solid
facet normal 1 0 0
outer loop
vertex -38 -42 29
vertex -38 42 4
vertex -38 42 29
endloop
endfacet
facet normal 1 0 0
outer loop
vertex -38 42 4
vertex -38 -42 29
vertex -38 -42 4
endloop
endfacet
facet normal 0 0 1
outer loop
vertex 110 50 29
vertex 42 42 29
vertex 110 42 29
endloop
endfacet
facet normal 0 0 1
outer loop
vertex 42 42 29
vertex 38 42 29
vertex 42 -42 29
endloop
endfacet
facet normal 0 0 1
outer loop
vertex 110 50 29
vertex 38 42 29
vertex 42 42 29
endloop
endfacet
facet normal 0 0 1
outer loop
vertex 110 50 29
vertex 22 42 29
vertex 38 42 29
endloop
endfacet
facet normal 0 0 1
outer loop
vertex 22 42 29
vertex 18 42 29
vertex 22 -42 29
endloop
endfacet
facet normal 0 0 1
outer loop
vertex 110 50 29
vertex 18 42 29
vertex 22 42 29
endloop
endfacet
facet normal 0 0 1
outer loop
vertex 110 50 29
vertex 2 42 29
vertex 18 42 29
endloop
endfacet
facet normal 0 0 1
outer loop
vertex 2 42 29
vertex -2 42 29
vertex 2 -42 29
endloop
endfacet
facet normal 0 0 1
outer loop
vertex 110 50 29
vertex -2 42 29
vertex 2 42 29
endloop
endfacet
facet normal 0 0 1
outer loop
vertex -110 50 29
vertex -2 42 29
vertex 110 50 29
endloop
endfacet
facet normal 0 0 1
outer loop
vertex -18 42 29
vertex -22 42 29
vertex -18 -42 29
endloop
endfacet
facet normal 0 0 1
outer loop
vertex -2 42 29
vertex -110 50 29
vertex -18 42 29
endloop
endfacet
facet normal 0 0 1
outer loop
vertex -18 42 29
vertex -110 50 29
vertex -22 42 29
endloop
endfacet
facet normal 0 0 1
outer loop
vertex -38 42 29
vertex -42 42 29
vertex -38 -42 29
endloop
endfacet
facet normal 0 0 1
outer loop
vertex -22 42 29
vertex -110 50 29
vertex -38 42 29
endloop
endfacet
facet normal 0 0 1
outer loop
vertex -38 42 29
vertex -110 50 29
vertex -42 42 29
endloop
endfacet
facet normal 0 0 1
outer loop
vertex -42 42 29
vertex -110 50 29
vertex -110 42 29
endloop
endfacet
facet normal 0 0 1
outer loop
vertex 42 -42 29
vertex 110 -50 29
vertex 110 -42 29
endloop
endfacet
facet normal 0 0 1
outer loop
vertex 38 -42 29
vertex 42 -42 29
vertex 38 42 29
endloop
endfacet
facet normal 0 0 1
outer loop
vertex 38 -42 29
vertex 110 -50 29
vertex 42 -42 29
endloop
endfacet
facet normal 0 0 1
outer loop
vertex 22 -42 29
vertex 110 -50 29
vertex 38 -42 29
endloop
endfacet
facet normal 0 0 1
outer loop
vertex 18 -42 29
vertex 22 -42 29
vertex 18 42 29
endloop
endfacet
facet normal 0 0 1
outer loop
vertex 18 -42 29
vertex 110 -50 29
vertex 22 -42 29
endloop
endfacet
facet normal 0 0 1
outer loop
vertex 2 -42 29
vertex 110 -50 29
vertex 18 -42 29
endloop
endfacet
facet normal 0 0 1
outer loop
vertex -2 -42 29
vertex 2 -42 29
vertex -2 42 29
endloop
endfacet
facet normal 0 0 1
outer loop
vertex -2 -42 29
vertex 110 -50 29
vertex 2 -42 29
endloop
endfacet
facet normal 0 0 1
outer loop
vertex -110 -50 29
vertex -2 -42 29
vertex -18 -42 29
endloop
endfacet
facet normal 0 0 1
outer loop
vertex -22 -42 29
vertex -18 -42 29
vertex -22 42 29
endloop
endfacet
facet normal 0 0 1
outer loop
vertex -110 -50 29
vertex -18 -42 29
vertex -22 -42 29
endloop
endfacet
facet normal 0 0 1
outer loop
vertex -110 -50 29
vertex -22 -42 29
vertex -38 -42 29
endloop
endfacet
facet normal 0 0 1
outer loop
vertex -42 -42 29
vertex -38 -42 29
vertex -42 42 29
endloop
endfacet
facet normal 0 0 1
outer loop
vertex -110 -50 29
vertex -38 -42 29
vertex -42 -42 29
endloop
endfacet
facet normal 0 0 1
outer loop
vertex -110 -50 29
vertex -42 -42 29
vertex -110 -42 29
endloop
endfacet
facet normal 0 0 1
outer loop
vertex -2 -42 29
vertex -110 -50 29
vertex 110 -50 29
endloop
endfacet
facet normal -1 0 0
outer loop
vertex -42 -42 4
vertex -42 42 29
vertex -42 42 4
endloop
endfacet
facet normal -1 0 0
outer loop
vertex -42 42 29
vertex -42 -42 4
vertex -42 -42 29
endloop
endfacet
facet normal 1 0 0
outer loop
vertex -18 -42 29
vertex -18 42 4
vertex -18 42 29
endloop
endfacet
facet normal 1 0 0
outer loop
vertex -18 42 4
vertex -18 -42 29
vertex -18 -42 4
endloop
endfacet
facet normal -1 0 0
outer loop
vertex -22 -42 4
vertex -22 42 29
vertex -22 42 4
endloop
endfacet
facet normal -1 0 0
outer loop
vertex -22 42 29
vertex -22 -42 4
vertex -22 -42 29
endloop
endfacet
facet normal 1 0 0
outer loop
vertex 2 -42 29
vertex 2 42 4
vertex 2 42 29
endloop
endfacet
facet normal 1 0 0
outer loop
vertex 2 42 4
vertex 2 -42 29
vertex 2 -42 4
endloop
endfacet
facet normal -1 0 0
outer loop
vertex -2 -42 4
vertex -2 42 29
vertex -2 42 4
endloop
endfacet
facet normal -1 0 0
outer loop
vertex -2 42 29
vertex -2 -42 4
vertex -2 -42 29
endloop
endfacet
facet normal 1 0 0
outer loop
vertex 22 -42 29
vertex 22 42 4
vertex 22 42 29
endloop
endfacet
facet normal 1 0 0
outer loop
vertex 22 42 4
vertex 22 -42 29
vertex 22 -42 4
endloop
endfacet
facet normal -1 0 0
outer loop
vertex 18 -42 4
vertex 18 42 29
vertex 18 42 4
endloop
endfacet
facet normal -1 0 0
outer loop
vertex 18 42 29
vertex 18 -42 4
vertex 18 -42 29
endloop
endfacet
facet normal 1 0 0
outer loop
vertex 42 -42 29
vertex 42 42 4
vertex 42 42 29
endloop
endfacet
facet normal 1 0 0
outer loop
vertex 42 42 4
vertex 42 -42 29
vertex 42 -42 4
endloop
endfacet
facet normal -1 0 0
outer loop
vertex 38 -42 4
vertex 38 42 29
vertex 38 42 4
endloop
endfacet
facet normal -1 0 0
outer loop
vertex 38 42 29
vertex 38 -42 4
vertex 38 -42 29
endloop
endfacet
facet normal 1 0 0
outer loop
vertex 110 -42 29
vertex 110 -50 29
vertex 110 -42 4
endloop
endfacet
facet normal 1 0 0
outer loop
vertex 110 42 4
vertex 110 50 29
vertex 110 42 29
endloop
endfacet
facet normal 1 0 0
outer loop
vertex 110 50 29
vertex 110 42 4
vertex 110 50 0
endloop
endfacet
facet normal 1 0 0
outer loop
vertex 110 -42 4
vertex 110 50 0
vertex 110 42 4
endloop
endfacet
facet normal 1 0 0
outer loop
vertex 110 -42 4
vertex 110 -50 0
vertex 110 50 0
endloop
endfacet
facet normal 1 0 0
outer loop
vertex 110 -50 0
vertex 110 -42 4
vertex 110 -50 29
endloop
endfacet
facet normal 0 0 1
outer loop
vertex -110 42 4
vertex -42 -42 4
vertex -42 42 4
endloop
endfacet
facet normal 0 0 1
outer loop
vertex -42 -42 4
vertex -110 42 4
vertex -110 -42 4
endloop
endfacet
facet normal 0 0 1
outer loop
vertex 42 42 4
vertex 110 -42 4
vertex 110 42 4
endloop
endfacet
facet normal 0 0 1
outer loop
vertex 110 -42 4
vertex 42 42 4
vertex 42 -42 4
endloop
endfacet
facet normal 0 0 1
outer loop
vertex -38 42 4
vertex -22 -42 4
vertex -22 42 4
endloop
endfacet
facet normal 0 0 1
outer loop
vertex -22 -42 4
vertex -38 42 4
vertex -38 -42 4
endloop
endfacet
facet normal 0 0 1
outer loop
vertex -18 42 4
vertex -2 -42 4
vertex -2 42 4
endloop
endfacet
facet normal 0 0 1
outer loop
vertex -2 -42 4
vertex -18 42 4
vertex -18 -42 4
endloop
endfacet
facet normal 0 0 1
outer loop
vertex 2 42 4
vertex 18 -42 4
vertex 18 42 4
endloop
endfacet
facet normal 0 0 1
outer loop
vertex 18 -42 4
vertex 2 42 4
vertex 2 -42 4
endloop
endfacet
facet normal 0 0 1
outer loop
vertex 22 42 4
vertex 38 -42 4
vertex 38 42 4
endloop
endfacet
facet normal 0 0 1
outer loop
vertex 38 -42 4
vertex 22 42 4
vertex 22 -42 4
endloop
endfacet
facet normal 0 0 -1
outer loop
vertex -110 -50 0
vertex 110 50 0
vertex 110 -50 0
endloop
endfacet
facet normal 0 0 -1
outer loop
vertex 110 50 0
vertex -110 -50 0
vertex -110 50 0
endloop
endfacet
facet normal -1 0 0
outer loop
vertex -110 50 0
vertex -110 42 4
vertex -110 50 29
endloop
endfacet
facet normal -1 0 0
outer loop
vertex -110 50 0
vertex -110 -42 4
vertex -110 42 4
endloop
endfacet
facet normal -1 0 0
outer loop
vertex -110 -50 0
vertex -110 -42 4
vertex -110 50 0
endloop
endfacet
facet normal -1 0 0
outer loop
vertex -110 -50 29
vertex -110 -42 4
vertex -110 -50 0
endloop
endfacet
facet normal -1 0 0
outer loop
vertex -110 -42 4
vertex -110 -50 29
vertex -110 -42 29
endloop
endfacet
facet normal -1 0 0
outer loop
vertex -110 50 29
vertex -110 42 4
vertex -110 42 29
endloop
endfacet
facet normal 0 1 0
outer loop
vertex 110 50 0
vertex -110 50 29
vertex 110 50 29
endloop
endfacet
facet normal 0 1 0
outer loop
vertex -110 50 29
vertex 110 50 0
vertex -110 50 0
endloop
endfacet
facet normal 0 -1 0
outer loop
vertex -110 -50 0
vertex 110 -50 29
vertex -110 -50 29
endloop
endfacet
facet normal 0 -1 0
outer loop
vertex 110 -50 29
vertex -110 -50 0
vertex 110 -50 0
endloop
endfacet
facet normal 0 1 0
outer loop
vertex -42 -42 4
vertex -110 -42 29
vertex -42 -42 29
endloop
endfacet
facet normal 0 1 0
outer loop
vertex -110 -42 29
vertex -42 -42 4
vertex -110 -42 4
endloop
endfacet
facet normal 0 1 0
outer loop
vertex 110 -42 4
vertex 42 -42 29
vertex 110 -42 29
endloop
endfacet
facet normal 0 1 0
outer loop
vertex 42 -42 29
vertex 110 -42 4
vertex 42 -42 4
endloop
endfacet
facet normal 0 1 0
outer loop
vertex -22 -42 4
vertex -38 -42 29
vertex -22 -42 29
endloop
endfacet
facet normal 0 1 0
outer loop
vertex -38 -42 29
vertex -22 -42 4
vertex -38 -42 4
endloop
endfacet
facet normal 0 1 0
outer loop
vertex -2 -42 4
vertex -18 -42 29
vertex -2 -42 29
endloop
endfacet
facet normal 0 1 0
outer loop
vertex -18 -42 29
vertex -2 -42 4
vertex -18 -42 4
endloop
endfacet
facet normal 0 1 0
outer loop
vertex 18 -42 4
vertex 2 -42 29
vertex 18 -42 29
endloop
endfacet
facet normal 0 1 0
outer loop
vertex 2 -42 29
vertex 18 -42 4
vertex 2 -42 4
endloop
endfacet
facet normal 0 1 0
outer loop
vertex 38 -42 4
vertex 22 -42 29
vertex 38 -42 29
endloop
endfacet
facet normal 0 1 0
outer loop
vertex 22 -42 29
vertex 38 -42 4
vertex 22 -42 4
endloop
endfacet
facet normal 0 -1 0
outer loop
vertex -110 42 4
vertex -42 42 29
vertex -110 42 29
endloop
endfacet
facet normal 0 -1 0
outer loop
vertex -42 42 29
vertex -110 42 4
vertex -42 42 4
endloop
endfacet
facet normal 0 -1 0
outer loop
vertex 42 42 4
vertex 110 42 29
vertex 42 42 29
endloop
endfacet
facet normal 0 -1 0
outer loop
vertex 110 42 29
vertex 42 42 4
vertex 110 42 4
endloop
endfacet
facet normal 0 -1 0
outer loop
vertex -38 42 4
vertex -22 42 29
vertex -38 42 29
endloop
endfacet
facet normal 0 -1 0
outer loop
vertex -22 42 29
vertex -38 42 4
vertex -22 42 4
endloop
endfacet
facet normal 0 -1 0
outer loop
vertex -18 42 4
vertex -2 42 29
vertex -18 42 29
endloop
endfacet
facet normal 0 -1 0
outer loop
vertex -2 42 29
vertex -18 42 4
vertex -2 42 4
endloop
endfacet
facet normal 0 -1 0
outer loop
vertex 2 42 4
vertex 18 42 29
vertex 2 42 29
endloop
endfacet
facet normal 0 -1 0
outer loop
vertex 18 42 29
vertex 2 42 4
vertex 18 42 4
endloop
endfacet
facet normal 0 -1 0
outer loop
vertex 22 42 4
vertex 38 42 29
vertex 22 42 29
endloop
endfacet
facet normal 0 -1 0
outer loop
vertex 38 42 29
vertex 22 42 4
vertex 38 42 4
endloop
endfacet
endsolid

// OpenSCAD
$fn = 32;

// ----------------------------------------------------------------------
// Rib frame 220 x 100 x 29
// 5 ribs at 20 mm pitch
// ----------------------------------------------------------------------

// --- parameters (mm) ---
frame = [220, 100, 4];  // base plate size (x, y, z)
seat_tol = 0.1;         // tolerance at the seating features
free_tol = 0.3;         // general tolerance on the free sizes
rail_w = 8;             // side rail width
ribs = 5;               // number of ribs
rib_t = 4;              // rib thickness
rib_h = 25;             // rib height above the base plate
pitch = 20;             // pitch between rib centres

// --- derived feature positions (mm) ---
span = (ribs - 1) * pitch;          // = 80   distance between the outer ribs
origin_x = -span / 2;               // = -40   X of the first rib
rib_len = frame[1] - 2 * rail_w + 2;  // = 86   rib length, 1 mm into each rail
feature_centers = [
  [origin_x + 0 * pitch, 0],
  [origin_x + 1 * pitch, 0],
  [origin_x + 2 * pitch, 0],
  [origin_x + 3 * pitch, 0],
  [origin_x + 4 * pitch, 0]
];   // rib centre line, drives the rib loop

// base plate, two side rails, then the ribs read straight off feature_centers
union() {
  translate([-frame[0] / 2, -frame[1] / 2, 0]) cube(frame);
  translate([-frame[0] / 2, -frame[1] / 2, 0]) cube([frame[0], rail_w, frame[2] + rib_h]);
  translate([-frame[0] / 2, frame[1] / 2 - rail_w, 0]) cube([frame[0], rail_w, frame[2] + rib_h]);
  for (centre = feature_centers)
    translate([centre[0] - rib_t / 2, centre[1] - rib_len / 2, frame[2] - 1])
      cube([rib_t, rib_len, rib_h + 1]);
}
